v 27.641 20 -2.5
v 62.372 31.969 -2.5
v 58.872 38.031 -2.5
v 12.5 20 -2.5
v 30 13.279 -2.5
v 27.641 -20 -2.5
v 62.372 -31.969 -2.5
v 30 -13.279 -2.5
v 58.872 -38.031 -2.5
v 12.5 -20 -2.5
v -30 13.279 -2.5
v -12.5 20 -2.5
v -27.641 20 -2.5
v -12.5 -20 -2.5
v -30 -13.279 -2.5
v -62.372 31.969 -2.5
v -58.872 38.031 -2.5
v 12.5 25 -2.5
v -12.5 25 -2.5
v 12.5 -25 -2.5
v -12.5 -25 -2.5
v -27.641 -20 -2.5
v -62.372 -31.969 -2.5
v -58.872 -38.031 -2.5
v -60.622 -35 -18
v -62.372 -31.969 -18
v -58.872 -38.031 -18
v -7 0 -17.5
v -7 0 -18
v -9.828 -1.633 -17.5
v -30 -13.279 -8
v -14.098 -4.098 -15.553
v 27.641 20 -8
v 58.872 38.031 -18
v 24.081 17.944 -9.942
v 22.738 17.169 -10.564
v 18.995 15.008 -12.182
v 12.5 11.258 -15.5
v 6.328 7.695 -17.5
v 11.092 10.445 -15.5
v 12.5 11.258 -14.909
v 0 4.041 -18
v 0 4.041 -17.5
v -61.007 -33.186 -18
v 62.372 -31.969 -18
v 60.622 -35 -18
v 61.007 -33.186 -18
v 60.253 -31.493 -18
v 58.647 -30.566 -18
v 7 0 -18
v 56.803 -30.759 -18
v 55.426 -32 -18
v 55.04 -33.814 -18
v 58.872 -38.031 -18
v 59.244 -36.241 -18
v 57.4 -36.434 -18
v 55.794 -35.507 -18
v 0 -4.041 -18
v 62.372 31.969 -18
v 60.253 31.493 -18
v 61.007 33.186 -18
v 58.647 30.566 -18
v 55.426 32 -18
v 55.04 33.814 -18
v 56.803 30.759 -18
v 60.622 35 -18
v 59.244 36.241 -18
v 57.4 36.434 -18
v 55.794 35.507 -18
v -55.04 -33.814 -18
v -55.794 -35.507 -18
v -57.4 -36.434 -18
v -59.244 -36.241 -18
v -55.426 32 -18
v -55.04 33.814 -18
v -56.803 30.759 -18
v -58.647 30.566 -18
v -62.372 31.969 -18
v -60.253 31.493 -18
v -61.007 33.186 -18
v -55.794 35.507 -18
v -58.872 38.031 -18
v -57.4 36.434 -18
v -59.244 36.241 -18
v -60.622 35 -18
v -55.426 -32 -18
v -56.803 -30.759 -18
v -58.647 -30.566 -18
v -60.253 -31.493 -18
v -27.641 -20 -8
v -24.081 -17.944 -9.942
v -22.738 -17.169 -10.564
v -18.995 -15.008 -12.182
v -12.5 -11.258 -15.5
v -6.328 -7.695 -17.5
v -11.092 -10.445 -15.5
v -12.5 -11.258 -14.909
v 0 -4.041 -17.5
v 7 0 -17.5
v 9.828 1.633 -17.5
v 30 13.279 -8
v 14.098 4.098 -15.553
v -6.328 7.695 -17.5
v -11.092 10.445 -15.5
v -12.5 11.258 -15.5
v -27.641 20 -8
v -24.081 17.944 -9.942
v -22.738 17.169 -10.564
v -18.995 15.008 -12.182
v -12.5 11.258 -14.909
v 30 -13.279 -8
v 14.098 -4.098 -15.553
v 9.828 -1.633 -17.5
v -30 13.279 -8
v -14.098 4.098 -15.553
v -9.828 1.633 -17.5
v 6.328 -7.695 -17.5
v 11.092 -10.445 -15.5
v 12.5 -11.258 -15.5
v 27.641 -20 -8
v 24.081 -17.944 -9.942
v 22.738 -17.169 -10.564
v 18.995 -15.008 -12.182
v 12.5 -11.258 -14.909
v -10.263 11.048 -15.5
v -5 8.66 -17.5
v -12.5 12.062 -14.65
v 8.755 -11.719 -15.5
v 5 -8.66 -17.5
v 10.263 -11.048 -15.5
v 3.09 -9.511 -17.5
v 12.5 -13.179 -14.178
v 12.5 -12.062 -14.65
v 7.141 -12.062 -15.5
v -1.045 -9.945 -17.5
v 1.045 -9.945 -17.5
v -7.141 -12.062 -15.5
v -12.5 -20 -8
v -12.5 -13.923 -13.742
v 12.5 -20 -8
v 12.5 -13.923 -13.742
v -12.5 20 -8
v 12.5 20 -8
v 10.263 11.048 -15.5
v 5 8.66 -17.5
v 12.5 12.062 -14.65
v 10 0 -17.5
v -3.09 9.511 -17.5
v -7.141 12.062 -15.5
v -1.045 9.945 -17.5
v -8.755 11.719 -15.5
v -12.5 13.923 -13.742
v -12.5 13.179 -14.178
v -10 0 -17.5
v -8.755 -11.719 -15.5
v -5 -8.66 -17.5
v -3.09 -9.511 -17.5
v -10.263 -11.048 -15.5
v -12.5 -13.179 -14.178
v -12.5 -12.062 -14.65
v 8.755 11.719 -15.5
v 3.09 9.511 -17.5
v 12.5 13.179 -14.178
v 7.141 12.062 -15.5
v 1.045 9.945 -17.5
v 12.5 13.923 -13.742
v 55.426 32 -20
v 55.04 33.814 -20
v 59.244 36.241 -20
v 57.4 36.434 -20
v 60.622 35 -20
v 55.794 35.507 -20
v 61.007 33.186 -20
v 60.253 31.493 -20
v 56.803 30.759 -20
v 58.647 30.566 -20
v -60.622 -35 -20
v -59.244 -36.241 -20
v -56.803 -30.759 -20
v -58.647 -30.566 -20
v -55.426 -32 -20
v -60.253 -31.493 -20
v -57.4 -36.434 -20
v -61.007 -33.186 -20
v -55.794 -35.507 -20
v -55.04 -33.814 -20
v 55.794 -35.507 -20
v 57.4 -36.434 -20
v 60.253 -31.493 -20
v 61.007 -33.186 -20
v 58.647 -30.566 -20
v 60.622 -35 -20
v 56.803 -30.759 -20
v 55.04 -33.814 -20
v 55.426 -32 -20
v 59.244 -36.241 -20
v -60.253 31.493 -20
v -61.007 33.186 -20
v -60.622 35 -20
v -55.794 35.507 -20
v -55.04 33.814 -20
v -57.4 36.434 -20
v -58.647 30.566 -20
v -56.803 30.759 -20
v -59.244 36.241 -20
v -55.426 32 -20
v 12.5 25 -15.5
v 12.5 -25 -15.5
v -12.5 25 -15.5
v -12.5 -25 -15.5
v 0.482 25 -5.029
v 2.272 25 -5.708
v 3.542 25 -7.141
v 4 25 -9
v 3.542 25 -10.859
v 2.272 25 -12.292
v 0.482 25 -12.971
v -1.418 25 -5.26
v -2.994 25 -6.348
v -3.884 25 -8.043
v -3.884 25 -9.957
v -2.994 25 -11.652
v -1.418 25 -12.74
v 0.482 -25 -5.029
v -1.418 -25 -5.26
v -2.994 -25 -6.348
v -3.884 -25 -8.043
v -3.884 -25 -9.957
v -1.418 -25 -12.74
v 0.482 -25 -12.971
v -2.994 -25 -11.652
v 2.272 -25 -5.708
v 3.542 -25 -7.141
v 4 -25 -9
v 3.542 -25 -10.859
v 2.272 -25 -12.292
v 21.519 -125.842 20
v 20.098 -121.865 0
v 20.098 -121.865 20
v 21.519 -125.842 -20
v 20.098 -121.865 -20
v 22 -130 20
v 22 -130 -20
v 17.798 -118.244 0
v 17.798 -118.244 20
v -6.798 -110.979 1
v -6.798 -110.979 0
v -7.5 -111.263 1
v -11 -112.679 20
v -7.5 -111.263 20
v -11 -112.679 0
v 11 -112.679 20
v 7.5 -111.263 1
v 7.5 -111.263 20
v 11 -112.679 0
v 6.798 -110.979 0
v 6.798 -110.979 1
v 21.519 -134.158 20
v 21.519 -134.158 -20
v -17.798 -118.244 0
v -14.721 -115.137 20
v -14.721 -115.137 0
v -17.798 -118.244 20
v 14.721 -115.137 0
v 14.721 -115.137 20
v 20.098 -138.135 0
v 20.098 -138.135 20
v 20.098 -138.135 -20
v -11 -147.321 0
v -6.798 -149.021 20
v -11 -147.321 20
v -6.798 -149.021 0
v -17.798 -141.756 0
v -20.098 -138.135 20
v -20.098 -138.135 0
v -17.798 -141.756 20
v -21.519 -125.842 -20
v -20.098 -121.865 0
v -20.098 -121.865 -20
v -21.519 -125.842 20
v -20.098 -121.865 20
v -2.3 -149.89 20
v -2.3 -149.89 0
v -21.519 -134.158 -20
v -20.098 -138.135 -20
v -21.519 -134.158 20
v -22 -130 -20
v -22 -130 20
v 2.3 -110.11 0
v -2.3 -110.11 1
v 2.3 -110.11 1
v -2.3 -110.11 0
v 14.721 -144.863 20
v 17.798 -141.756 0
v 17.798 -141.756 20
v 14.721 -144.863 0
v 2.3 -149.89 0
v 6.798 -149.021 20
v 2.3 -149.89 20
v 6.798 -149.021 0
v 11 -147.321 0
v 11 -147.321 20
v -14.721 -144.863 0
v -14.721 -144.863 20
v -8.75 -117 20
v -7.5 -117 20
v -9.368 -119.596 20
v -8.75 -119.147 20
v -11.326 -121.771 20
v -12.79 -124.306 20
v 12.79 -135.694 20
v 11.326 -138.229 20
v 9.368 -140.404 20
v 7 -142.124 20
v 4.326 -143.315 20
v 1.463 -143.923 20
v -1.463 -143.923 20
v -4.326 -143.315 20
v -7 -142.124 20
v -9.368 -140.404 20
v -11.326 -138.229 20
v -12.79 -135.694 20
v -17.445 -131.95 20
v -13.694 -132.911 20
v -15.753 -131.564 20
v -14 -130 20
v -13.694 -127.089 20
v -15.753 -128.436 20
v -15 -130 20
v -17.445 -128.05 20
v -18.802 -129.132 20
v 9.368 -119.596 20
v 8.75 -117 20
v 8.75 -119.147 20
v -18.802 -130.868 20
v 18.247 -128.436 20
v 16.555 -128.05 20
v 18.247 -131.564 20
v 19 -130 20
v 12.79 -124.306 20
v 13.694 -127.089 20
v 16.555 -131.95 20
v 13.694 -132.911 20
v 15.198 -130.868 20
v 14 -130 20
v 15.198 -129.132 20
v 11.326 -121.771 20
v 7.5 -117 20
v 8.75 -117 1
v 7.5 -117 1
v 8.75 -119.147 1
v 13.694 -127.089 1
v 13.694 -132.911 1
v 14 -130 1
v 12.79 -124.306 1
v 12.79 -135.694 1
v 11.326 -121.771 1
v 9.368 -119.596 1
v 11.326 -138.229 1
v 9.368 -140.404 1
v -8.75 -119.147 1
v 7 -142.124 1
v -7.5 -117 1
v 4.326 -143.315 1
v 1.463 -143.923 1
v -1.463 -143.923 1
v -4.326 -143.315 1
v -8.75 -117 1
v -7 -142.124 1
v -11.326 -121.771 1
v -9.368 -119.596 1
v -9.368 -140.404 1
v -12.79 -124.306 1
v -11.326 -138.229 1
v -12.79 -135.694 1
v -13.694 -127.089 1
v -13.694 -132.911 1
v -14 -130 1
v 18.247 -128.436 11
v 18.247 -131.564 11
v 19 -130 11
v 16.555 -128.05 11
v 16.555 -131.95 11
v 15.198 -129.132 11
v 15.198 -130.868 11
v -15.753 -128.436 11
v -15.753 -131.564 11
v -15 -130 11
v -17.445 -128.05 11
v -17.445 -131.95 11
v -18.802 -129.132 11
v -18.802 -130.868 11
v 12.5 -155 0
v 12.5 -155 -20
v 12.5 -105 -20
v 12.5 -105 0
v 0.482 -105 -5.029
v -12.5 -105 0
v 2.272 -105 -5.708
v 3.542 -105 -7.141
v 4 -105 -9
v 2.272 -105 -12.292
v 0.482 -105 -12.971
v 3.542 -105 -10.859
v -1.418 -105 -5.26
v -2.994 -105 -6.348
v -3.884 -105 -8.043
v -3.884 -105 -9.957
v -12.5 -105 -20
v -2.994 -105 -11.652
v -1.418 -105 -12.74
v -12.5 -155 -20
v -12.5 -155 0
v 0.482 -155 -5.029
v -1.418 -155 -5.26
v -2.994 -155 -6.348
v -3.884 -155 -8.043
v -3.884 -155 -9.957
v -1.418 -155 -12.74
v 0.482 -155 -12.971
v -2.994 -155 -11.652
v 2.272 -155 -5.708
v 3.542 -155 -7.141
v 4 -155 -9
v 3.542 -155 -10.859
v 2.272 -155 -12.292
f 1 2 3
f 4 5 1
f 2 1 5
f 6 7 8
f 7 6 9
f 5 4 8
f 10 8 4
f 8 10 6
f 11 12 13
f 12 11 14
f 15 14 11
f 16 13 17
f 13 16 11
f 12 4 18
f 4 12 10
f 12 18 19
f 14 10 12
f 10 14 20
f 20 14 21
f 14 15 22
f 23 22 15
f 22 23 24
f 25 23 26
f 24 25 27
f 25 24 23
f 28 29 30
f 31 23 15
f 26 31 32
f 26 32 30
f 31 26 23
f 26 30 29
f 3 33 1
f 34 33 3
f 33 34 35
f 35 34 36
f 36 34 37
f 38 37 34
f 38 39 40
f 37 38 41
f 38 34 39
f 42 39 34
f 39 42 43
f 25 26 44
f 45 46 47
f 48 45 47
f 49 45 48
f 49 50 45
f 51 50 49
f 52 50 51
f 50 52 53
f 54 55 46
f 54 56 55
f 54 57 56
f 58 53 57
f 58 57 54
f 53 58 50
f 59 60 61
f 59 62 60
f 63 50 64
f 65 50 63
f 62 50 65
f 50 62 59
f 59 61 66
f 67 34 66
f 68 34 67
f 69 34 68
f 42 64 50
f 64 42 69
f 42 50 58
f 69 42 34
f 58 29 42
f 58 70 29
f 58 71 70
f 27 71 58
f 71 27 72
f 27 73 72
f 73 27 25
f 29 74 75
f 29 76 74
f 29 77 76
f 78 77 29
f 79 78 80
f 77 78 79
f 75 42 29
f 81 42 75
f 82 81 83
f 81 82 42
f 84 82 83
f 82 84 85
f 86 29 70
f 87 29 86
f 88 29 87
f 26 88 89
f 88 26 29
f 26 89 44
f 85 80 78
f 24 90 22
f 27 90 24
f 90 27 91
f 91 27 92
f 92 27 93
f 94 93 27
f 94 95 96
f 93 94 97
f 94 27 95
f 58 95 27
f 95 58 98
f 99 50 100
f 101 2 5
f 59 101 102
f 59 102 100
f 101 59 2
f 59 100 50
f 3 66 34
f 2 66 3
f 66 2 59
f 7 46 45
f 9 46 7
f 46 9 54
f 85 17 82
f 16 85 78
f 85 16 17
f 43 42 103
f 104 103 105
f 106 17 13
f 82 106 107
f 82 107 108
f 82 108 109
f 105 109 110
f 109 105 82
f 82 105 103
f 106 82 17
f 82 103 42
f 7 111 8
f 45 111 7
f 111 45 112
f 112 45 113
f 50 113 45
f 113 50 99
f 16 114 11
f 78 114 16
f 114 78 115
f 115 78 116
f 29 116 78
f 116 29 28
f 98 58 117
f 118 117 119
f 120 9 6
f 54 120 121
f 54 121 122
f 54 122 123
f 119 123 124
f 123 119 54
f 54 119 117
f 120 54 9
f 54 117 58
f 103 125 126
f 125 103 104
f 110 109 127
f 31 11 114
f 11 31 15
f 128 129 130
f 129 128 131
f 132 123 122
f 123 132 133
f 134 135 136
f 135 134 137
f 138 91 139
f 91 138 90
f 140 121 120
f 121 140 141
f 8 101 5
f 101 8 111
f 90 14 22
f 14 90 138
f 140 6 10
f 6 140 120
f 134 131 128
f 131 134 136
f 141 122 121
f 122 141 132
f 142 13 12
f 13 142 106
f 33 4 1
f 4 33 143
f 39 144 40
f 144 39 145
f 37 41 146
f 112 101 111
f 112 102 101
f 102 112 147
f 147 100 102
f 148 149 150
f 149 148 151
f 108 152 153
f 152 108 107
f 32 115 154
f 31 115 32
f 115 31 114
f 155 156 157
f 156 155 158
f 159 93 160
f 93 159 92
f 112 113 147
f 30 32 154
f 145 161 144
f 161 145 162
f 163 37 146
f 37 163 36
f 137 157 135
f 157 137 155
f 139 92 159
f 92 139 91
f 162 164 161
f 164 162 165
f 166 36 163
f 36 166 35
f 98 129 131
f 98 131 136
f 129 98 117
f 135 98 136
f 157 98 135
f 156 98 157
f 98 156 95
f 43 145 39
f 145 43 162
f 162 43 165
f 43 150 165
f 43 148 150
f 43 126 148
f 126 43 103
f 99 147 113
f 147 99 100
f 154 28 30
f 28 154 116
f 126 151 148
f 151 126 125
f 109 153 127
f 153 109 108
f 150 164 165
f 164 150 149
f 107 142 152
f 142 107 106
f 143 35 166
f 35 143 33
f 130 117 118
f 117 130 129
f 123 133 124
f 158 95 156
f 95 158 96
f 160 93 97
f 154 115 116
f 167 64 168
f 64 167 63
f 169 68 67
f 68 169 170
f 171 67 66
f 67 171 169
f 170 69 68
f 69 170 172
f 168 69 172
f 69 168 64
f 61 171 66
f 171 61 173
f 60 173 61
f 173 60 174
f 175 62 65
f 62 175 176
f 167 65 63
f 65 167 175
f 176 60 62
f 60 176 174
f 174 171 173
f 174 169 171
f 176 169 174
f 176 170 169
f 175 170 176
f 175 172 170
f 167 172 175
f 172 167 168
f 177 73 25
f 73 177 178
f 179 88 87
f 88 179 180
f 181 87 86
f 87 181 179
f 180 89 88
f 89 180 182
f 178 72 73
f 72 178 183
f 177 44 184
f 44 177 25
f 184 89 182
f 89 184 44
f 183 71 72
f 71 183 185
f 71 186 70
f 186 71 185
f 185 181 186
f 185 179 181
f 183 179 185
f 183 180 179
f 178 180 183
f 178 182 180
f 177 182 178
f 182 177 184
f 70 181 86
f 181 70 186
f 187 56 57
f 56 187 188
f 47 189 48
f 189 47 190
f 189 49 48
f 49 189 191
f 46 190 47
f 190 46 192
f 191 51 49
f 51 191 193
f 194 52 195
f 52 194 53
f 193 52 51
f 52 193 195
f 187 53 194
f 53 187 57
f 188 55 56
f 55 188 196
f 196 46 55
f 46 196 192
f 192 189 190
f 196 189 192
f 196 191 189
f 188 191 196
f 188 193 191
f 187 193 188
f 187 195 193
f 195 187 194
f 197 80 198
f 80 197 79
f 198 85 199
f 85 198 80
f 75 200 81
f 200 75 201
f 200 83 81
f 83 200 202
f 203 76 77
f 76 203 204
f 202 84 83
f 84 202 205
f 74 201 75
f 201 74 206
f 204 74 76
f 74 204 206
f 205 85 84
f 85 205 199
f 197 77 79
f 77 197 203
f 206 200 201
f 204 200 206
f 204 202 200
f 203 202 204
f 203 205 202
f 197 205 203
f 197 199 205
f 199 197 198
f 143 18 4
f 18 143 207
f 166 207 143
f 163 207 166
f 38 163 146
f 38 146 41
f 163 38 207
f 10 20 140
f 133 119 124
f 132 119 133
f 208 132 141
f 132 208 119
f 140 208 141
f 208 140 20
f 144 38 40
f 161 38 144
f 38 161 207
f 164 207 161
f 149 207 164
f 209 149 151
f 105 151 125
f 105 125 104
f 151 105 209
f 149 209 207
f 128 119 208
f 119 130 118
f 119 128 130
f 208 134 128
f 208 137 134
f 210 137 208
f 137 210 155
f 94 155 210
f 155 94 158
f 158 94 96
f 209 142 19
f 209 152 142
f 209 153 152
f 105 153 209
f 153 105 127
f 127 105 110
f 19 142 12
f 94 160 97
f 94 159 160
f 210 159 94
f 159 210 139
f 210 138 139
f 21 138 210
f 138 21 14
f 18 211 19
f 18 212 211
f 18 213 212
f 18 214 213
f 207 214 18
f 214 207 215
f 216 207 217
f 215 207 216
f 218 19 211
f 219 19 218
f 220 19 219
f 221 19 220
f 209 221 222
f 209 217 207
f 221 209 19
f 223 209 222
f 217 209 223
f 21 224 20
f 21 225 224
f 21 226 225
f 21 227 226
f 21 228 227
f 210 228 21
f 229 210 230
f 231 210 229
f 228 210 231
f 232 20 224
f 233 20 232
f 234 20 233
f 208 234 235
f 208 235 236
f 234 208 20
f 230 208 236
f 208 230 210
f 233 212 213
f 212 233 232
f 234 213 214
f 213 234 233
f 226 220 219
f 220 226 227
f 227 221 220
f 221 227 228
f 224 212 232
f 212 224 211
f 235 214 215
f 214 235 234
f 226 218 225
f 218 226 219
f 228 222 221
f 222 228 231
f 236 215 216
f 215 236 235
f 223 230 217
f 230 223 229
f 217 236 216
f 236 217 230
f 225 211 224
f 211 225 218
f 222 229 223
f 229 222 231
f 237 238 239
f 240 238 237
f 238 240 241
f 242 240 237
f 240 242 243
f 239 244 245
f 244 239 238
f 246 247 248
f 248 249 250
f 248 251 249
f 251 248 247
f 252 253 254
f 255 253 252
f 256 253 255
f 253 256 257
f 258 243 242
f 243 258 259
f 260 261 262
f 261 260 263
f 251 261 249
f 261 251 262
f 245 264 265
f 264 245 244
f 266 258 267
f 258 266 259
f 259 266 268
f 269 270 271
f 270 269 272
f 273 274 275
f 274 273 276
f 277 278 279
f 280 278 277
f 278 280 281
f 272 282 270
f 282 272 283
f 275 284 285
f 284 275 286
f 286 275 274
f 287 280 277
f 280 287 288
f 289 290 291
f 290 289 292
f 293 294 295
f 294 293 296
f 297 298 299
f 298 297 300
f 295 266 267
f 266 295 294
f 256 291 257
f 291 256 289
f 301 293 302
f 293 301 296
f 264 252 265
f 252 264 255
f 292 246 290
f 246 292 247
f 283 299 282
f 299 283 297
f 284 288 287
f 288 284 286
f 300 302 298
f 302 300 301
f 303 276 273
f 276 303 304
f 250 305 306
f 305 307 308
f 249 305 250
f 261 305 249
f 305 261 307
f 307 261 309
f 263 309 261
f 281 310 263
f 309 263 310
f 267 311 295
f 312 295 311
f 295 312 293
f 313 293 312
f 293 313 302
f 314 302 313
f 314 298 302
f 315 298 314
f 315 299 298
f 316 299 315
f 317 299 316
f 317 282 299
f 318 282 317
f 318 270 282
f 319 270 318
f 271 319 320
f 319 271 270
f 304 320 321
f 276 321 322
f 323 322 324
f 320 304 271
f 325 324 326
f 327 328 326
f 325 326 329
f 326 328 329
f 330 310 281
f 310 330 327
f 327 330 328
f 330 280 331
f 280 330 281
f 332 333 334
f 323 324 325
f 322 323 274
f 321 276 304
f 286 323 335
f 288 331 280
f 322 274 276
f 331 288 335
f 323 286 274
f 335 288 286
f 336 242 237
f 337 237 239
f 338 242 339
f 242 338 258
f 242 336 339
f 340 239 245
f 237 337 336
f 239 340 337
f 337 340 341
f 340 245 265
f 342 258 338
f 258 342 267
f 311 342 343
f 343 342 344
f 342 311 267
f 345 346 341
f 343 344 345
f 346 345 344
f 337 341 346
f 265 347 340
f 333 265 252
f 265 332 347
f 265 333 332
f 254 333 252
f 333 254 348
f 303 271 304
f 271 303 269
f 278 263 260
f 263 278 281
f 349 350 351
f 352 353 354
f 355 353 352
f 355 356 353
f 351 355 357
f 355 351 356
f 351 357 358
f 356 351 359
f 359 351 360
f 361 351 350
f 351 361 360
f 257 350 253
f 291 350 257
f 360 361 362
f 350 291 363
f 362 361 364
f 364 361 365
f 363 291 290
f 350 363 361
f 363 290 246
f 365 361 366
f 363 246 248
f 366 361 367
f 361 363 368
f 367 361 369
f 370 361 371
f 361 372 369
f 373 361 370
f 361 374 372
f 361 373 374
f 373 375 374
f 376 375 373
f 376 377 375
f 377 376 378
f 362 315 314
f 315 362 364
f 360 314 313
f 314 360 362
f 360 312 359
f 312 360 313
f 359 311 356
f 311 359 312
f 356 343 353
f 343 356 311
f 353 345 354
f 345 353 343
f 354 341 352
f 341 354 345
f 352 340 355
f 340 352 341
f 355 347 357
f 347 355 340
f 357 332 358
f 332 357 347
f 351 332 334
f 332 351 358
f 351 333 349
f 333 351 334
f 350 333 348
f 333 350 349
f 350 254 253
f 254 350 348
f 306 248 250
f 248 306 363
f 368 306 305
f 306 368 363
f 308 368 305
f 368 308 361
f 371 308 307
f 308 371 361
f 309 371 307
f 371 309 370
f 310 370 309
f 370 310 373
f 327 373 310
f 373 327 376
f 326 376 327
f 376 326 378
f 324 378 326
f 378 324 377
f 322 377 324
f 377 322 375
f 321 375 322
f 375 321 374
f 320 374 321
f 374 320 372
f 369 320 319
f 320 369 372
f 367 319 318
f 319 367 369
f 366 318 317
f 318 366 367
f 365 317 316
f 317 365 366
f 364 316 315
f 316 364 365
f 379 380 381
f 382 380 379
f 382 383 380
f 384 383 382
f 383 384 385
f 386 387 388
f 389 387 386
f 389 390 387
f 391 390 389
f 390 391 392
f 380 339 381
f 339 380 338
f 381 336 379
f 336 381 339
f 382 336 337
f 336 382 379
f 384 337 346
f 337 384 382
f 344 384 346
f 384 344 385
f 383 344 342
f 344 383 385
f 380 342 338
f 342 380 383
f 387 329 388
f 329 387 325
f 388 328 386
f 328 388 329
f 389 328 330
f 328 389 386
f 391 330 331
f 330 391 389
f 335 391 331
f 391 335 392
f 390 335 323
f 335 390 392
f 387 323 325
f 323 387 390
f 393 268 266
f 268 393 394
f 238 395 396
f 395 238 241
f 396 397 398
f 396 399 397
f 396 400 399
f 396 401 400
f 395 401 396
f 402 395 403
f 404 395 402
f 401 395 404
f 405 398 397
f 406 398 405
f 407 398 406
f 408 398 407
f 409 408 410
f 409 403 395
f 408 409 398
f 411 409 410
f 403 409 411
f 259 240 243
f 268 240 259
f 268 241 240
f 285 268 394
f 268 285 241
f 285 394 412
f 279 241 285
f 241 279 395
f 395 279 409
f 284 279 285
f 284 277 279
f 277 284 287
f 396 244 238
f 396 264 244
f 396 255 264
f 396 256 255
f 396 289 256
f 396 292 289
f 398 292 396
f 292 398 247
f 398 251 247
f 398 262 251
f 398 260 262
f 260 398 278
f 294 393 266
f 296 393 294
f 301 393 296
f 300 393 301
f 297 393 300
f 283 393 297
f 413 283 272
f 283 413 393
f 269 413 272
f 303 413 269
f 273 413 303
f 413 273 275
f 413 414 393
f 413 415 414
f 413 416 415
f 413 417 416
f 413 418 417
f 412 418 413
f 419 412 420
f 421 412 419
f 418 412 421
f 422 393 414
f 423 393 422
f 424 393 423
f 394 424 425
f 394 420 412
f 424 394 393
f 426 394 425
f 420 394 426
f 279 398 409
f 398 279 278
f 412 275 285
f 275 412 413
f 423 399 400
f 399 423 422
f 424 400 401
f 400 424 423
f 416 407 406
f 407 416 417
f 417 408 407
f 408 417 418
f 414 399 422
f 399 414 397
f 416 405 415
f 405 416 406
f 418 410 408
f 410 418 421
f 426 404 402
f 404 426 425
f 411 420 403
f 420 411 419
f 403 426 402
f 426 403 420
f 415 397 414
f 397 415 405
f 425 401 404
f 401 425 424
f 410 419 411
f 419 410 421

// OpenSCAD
// legs
difference(){
union(){
	color("gray")translate([0,0,-10.25])rotate([0,0,30])cube([140,7,15.5],true);
	color("gray")translate([0,0,-10.25])rotate([0,0,-30])cube([140,7,15.5],true);

	color("lime")hull(){
		translate([0,0,-7])cube([60,40,2], true);
		translate([0,0,-17])cylinder(1,10,10,true);
	}
	translate([0,0,-5])cube([60,40,5], true);


	rotate([0,0,30])translate([67,0,-20])cylinder(2,3,3);
	rotate([0,0,30])translate([-67,0,-20])cylinder(2,3,3);
	rotate([0,0,-30])translate([67,0,-20])cylinder(2,3,3);
	rotate([0,0,-30])translate([-67,0,-20])cylinder(2,3,3);


	color("green")translate([-12.5,-25,-15.5])cube([25,50,13]);
}
rotate([90,0,0])translate([0,-9,0])cylinder(60,4,4,true);
}
	



// MOTOR HOLDER 
translate([0,-130,-4]){
	difference(){
		scale([1.1,1])cylinder(24, 20,20);

		color("blue")translate([0,0,5])linear_extrude(height = 19.3, center = false){
			circle(14);
			translate([0,8,0])square([17.5,10],true);
			translate([0,15,0]) square([15,10],true);
		}

		color("green")translate([0,0,15])linear_extrude(height = 10, center = false){
			translate([17,0,0])circle(2);
			translate([-17,0,0])circle(2);
		}
	}

	difference(){
		translate([0,0,-16])linear_extrude(height = 20, center = false)hull(){
			scale([1.1,1])circle(20);
			translate([0,20,0])square([25,10],true);
			translate([0,-20,0])square([25,10],true);
		}

		rotate([90,0,0])translate([0,-5,0])cylinder(60,4,4,true);
	}
}
//floor
*color("olive")translate([0,0,-25])cube([300,300,10],true);

// screw
*color("blue")rotate([90,0,0])translate([0,-9,50])cylinder(300,4,4,true);
		
